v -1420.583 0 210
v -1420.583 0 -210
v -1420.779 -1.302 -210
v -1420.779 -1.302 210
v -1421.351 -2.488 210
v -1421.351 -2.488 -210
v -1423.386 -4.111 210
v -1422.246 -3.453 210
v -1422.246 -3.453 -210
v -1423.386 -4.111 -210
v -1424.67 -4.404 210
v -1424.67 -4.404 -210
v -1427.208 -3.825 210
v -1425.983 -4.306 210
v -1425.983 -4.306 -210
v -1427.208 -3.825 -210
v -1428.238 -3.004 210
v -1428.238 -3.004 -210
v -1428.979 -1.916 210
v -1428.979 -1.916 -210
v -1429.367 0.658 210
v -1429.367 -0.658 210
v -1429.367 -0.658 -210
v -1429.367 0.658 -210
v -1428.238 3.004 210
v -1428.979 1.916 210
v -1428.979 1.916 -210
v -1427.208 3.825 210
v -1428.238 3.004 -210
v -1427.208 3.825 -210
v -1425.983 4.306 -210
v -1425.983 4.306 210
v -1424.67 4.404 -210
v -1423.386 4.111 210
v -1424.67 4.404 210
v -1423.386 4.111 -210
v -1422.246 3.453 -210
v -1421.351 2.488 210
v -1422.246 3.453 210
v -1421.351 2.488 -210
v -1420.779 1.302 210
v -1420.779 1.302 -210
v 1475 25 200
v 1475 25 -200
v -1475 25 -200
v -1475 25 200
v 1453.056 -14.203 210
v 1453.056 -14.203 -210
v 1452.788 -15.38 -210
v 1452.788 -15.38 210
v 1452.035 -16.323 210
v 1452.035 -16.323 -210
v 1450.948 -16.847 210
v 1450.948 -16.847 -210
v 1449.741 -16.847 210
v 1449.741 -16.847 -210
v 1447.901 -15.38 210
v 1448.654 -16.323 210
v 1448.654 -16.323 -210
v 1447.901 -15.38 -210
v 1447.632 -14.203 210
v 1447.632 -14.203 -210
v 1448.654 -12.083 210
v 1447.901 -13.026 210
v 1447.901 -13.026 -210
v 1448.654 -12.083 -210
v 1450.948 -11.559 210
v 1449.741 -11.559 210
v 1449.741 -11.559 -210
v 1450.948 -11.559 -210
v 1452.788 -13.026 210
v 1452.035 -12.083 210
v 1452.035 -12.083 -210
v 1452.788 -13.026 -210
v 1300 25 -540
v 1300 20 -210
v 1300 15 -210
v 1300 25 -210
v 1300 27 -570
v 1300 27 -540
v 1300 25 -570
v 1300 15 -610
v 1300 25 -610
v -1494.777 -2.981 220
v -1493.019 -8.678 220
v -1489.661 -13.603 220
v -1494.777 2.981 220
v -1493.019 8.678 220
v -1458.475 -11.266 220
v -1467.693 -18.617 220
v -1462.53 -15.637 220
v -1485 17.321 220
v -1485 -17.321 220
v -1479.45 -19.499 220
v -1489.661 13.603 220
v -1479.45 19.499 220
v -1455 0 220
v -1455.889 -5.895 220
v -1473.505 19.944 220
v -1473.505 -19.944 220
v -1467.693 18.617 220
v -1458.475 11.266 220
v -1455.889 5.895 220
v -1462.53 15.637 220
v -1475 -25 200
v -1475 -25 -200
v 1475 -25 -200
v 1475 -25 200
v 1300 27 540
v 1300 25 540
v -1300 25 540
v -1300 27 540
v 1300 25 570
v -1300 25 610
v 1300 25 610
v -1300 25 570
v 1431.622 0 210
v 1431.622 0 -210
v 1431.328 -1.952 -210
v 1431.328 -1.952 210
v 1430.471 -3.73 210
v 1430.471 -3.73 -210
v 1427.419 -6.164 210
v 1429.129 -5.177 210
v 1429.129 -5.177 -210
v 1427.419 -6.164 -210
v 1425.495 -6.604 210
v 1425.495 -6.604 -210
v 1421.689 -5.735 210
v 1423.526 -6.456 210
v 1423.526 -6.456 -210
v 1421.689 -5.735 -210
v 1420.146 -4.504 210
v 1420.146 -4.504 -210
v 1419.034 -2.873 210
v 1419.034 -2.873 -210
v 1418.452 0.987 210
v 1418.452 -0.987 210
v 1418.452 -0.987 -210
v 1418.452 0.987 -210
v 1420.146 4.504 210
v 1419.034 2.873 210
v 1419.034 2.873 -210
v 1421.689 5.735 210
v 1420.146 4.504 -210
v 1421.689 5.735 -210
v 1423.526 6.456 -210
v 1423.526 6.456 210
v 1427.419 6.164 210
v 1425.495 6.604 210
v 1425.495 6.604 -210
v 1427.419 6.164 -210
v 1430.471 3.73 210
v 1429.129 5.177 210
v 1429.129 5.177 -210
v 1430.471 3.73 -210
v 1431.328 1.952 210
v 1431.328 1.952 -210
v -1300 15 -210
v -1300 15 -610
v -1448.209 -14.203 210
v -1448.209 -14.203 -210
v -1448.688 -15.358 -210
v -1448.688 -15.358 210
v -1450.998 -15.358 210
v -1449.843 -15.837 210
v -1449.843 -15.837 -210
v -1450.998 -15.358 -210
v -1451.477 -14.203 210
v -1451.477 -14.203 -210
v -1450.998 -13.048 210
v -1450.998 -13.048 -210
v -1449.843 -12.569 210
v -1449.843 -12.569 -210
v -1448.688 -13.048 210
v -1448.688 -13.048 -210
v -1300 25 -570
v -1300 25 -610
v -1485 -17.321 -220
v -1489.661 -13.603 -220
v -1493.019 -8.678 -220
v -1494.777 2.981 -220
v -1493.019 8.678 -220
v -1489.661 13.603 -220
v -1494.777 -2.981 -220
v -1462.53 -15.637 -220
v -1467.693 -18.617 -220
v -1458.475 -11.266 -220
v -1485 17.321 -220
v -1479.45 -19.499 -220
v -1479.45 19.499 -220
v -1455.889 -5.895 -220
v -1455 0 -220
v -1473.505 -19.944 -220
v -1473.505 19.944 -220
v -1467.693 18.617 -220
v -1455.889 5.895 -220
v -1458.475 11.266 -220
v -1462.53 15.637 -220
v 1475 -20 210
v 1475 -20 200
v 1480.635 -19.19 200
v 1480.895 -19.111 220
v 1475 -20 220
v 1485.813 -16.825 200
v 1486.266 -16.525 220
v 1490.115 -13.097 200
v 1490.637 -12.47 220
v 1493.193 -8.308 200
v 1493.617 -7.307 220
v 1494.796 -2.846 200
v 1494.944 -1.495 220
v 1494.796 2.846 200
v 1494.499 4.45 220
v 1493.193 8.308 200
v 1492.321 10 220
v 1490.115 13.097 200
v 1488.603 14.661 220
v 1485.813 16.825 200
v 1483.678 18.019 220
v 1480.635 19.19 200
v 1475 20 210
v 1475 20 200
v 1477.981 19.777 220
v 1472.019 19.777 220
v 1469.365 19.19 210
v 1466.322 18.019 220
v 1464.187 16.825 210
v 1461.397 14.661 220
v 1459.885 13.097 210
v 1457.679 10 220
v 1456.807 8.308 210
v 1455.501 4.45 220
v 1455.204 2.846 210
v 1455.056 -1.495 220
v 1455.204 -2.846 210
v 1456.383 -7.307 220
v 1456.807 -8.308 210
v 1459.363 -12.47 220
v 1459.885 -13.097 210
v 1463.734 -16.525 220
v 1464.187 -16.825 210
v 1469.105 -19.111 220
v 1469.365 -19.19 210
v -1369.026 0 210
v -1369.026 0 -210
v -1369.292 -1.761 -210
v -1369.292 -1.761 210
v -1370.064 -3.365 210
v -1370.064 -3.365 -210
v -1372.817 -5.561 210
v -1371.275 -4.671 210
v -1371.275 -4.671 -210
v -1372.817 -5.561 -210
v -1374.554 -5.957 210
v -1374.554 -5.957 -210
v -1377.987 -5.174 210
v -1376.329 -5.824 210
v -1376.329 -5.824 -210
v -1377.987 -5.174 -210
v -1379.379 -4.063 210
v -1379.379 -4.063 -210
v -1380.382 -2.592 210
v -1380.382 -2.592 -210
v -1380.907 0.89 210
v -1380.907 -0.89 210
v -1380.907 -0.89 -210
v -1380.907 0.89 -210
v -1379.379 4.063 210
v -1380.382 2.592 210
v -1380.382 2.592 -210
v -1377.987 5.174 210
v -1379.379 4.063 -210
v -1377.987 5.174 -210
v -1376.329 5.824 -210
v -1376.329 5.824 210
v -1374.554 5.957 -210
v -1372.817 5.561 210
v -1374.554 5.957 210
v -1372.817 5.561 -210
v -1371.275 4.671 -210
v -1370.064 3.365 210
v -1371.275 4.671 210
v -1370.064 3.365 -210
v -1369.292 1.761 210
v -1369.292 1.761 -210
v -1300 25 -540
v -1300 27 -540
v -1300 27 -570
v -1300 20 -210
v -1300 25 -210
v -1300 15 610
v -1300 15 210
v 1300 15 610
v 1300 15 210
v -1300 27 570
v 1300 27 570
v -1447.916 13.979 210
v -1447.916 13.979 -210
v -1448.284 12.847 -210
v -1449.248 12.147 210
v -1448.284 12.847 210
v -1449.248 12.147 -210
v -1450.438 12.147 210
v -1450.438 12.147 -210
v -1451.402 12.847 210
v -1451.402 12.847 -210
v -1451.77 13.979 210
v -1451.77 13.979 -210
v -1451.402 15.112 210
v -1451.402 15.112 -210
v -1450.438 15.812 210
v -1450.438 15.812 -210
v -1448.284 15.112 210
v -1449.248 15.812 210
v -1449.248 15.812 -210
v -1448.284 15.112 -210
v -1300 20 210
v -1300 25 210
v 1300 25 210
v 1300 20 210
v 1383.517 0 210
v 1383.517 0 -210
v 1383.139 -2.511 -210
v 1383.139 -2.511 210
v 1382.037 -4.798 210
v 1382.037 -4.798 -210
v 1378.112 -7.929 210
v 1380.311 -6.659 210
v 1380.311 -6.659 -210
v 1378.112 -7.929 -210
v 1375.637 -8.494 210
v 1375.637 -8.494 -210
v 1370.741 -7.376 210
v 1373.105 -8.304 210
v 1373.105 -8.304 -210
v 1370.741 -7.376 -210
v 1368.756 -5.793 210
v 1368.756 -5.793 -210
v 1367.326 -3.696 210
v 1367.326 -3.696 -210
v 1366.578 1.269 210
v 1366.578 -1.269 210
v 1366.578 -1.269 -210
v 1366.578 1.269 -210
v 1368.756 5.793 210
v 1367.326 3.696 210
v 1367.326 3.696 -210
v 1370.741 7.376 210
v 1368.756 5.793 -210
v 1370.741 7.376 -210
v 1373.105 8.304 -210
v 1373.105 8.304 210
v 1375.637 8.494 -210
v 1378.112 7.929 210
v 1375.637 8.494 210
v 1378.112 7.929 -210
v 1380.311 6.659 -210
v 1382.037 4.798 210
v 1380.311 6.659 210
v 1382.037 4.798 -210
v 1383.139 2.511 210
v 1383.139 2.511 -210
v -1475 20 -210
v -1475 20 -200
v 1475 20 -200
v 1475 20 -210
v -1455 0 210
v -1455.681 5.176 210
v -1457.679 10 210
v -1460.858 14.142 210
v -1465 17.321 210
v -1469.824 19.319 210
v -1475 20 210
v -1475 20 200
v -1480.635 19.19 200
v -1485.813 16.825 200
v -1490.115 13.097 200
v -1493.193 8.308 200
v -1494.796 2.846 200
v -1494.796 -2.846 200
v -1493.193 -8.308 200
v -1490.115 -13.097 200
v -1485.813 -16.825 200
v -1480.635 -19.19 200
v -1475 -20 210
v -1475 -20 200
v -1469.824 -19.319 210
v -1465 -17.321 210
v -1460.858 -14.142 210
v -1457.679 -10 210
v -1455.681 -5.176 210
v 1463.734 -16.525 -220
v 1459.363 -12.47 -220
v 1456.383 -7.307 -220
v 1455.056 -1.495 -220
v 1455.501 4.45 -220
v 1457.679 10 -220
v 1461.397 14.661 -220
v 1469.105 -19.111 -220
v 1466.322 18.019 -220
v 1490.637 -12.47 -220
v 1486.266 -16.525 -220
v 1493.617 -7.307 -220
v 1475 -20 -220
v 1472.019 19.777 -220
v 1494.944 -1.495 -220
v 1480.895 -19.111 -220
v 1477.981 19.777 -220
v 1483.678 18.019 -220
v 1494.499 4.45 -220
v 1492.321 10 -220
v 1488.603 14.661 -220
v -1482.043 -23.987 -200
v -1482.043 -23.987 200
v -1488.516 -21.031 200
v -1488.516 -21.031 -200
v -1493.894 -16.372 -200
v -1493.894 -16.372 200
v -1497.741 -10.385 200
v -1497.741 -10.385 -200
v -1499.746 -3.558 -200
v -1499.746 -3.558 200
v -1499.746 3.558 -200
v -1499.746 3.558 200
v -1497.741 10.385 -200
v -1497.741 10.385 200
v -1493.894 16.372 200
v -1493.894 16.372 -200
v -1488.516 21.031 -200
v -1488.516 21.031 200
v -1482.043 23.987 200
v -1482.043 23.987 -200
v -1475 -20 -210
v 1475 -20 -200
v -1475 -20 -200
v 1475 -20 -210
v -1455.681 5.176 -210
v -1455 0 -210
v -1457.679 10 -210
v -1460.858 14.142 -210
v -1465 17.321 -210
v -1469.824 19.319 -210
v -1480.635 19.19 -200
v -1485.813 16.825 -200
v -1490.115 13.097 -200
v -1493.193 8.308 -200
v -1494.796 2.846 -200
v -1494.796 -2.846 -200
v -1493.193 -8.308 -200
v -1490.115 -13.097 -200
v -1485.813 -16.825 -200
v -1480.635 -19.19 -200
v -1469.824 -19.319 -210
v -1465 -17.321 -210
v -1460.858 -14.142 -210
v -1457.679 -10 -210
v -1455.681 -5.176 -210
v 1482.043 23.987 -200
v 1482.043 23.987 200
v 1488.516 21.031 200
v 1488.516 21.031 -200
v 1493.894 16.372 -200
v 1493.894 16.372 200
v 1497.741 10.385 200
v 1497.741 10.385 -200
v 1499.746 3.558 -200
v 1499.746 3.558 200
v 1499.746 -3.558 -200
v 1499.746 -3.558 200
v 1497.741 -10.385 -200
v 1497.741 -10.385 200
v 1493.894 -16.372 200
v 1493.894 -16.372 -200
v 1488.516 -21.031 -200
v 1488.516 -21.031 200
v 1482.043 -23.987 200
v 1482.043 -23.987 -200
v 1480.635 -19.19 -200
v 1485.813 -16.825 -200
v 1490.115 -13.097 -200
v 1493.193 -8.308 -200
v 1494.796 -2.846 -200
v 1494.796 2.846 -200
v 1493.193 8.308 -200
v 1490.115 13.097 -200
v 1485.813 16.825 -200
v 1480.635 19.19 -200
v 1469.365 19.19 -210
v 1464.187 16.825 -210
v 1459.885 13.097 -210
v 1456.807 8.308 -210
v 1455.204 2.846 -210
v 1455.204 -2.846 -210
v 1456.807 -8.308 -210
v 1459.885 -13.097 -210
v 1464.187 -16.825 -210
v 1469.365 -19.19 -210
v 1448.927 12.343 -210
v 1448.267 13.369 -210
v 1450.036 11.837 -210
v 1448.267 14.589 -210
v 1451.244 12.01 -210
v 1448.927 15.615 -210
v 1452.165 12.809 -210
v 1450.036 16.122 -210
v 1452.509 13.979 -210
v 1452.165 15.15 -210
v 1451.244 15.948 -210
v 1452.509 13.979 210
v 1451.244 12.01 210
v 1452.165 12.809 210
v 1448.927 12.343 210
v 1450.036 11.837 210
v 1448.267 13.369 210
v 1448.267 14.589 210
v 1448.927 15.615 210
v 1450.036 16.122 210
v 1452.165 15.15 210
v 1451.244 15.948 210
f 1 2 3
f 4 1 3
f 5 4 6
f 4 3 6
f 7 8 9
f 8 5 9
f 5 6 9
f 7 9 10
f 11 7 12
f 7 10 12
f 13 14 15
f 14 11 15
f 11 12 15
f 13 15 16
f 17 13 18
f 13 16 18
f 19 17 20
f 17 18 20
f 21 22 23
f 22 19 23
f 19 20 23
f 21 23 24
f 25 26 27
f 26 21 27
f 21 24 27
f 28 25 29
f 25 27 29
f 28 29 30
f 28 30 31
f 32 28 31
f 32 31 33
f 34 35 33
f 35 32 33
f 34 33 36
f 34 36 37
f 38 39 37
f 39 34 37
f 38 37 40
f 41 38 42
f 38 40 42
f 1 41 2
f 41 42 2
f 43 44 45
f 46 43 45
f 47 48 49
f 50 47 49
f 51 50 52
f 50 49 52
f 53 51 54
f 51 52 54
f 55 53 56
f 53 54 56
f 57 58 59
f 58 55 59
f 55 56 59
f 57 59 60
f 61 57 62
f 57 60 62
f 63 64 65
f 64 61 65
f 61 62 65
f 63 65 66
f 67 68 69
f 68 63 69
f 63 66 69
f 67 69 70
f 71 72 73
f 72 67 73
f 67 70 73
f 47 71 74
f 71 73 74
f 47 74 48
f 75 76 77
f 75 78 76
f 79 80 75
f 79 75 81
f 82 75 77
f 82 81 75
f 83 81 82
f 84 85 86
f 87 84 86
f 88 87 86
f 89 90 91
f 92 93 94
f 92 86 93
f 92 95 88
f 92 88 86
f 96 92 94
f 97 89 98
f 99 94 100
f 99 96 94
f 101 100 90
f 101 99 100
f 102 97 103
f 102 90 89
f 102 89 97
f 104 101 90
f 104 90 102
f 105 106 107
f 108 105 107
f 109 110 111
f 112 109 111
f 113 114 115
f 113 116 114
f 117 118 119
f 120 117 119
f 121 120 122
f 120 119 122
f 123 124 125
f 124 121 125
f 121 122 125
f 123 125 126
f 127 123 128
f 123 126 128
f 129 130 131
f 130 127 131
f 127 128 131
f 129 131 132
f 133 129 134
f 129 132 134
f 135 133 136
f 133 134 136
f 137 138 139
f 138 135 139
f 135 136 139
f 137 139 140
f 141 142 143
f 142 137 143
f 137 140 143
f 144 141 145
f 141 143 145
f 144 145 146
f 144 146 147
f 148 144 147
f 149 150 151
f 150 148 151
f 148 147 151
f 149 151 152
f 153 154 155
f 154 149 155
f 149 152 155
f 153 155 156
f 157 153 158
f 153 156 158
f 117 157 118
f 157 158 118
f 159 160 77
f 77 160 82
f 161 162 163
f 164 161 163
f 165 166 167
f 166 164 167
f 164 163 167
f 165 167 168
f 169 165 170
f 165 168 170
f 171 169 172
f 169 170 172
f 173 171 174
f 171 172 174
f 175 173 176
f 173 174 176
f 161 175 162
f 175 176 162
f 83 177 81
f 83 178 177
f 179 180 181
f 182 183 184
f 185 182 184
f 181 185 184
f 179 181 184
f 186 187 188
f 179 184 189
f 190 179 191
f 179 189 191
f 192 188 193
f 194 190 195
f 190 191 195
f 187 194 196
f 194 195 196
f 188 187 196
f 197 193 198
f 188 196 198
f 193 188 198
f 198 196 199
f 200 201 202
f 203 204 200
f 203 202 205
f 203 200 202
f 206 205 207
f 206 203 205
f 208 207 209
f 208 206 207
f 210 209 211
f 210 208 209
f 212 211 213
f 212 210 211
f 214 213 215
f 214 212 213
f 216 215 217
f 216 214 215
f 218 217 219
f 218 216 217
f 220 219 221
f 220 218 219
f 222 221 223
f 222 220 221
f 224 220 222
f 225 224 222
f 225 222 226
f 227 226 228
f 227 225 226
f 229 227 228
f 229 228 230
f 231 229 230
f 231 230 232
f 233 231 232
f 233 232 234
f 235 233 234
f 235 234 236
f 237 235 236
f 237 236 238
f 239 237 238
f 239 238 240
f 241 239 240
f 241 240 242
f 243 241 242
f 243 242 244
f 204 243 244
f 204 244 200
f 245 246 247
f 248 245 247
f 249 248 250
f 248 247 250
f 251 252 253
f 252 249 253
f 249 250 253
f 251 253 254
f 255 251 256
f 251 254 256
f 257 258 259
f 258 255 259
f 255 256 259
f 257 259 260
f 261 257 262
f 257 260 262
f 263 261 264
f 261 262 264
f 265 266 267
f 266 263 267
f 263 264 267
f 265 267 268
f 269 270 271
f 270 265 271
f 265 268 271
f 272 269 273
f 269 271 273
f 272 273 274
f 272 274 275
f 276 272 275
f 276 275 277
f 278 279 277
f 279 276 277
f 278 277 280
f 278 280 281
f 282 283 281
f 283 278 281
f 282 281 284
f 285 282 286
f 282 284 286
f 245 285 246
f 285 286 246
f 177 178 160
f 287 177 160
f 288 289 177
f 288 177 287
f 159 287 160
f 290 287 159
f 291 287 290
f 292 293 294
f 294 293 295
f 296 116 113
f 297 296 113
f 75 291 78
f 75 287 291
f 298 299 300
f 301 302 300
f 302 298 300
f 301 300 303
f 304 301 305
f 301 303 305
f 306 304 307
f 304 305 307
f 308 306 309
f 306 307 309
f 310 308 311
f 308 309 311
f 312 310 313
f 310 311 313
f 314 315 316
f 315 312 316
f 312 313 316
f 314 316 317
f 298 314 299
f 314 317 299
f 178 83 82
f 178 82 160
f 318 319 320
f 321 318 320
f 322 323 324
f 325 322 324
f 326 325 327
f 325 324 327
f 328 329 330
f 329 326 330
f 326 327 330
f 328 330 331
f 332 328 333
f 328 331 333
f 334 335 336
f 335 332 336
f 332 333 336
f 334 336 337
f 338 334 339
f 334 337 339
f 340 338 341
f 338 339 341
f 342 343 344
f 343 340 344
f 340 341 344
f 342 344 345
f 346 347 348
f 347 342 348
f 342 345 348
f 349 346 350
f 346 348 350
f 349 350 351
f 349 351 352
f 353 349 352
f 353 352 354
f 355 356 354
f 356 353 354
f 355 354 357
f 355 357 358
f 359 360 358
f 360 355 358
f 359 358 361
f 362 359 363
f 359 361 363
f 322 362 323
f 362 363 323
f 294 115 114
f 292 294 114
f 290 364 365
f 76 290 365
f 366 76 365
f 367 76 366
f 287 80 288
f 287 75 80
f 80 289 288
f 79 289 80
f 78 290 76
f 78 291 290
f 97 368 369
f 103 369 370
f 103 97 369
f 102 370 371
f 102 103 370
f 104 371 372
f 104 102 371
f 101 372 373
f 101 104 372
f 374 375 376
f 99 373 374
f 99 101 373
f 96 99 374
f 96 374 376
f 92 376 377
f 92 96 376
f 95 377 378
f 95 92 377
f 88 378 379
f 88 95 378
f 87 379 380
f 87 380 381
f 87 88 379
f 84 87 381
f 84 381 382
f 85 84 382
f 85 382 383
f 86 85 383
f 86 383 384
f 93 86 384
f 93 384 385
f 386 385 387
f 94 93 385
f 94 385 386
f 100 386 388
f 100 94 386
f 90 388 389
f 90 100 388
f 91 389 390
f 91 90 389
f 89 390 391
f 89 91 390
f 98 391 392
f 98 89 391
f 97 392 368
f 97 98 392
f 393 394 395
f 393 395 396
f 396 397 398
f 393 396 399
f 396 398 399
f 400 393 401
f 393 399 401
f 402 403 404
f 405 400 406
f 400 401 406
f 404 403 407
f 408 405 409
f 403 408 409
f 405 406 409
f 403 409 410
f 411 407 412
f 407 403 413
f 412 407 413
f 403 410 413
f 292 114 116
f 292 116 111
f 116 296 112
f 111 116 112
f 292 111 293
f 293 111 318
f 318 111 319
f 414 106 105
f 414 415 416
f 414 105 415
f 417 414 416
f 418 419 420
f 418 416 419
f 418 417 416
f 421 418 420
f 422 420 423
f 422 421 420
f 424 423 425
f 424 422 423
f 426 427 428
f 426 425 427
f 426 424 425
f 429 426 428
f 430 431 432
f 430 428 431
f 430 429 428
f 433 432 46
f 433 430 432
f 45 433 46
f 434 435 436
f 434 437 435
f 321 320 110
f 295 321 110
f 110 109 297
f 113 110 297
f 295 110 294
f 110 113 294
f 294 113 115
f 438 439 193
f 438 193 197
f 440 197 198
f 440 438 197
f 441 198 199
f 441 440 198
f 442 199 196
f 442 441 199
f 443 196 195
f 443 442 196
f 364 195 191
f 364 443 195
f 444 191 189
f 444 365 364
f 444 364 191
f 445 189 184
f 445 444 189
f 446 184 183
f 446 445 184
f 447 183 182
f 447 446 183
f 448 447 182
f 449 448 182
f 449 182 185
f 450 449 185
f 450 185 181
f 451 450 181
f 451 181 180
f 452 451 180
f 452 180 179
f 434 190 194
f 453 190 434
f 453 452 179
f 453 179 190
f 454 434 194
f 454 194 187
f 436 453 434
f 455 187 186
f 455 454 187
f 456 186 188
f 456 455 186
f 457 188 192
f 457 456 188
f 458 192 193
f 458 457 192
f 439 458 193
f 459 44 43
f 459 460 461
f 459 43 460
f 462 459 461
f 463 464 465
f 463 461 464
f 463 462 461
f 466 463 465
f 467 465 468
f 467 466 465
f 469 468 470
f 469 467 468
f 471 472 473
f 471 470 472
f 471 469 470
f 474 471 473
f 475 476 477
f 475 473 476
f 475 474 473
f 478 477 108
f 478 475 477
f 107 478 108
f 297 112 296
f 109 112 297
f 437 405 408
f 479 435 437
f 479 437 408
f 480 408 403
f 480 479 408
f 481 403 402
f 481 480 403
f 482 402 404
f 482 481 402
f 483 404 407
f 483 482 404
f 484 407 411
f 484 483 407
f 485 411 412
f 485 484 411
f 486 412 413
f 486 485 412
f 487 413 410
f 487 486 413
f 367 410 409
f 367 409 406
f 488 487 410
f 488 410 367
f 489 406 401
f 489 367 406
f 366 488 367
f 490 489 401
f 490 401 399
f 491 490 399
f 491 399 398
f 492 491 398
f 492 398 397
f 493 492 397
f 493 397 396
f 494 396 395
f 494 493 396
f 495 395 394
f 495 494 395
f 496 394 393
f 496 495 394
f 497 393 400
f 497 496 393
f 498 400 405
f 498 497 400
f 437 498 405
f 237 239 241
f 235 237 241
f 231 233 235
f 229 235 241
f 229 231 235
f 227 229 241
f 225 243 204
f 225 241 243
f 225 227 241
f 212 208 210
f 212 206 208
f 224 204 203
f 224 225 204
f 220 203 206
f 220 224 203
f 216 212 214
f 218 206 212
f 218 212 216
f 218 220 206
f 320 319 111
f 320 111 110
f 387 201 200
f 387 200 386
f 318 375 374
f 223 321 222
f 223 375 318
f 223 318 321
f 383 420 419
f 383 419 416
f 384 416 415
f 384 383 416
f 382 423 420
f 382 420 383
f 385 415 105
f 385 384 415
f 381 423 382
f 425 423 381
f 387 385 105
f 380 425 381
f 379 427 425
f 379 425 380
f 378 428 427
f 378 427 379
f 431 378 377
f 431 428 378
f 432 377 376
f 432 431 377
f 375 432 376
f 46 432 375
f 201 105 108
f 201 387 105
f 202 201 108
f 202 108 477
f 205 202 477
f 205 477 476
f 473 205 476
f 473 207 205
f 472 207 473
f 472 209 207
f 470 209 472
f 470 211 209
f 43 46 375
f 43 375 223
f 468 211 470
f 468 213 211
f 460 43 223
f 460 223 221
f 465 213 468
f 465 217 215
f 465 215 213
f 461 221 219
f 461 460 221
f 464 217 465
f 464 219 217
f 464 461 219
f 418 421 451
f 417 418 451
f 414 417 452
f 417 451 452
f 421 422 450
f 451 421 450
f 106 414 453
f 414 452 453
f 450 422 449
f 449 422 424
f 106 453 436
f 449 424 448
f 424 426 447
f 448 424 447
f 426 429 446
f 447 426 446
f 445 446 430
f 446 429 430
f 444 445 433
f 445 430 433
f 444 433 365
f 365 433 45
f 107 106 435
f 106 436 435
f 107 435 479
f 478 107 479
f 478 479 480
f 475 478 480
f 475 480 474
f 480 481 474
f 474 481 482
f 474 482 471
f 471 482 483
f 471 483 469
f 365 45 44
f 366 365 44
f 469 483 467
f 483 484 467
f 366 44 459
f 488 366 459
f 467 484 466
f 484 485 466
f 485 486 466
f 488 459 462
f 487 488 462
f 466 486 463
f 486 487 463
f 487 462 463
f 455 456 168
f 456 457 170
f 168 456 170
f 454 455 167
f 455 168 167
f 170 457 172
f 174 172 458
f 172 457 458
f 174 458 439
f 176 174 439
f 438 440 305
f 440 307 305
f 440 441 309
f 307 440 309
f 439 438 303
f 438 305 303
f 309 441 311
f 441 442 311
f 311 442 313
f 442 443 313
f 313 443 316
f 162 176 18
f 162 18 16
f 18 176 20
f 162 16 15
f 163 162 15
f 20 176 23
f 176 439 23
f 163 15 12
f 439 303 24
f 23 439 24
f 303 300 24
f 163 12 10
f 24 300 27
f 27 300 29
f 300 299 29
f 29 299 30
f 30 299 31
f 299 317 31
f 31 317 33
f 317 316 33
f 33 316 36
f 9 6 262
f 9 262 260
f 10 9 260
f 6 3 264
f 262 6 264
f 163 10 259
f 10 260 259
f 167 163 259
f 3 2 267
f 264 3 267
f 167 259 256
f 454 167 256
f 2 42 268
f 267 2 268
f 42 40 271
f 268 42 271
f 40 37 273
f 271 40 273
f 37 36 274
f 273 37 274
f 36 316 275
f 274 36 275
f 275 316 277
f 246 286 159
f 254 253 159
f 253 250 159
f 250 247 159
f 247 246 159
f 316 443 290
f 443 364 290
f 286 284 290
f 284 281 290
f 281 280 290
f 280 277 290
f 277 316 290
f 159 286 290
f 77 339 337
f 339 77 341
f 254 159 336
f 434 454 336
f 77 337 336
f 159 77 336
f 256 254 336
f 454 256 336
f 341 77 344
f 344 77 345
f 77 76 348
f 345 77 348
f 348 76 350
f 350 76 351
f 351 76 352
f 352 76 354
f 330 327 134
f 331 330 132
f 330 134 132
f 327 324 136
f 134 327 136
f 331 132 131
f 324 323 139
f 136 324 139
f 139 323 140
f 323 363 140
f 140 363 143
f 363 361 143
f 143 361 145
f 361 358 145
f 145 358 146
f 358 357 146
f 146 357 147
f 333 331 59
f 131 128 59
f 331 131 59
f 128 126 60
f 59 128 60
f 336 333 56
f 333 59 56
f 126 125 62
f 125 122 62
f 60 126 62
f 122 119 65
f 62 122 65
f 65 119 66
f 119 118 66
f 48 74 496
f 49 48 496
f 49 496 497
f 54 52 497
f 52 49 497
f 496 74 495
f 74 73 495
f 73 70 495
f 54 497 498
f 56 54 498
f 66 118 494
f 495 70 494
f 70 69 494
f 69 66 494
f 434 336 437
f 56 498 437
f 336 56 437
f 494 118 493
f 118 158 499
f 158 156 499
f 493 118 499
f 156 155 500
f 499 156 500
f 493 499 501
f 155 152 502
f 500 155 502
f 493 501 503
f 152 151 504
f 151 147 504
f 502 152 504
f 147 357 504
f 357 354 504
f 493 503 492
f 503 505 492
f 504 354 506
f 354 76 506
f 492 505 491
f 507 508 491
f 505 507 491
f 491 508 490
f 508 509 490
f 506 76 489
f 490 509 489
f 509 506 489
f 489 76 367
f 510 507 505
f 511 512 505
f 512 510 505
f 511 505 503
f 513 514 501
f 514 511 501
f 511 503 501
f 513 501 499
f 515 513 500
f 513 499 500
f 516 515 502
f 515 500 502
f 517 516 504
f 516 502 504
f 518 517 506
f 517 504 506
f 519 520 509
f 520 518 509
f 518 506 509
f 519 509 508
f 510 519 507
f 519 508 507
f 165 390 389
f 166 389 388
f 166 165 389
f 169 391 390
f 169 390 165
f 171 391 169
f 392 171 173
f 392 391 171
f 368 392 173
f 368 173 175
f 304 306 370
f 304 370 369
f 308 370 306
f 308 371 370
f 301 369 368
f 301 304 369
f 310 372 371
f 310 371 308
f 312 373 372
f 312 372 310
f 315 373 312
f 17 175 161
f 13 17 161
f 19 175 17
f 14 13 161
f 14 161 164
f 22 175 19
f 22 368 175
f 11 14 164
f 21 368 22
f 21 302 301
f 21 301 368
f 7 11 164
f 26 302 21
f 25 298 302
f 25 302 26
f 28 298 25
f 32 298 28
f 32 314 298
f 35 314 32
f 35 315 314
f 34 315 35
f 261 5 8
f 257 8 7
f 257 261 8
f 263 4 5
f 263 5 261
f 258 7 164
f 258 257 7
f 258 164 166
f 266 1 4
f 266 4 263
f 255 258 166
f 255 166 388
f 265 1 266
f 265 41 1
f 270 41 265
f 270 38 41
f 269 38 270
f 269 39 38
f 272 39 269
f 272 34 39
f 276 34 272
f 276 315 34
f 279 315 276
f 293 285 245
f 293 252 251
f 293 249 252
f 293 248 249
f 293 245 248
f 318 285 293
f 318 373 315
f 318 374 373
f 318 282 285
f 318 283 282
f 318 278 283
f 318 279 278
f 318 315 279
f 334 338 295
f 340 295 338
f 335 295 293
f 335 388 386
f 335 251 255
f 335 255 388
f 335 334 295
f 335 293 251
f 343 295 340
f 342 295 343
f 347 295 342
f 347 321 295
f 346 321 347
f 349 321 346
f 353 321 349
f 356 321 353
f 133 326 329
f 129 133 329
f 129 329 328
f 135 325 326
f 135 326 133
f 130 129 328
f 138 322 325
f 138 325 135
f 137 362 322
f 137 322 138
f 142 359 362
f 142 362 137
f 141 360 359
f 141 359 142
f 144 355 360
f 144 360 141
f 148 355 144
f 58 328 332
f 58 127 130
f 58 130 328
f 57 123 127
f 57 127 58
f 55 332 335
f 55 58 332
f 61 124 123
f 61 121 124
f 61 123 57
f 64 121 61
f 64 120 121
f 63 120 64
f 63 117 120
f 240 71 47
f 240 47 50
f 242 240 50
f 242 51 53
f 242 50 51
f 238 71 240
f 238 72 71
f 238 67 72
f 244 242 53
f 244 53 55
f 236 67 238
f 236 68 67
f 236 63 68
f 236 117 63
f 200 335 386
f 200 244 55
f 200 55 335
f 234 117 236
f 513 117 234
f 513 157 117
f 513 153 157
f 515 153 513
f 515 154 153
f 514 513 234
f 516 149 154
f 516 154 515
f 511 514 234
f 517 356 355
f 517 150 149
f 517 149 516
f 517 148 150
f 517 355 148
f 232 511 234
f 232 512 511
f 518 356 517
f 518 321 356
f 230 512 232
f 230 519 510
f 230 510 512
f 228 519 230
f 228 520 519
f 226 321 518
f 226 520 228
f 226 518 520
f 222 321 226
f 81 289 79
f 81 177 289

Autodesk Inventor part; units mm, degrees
ref_plane "YZ Plane" through (0, 0, 0) normal (1, 0, 0) x (0, 1, 0)
ref_plane "XZ Plane" through (0, 0, 0) normal (0, 1, 0) x (-1, 0, 0)
ref_plane "XY Plane" through (0, 0, 0) normal (0, 0, 1) x (1, 0, 0)
sketch "Sketch1" plane through (0, 0, 0) normal (0, 0, 1) x (1, 0, 0)
  line L0 (-1500, 0) -> (1500, 0) construction
  line L1 (-1475, -25) -> (1475, -25)
  line L2 (1475, 25) -> (-1475, 25)
  arc A0 (-1475, 25) -> (-1475, -25) centre (-1475, 0) ccw
  arc A1 (1475, -25) -> (1475, 25) centre (1475, 0) ccw
  line L3 (-1475, 20) -> (1475, 20)
  arc A2 (1475, -20) -> (1475, 20) centre (1475, 0) ccw
  line L4 (1475, -20) -> (-1475, -20)
  arc A3 (-1475, 20) -> (-1475, -20) centre (-1475, 0) ccw
  circle A4 centre (-1475, 0) radius 20
  circle A5 centre (1475, 0) radius 20
  circle A6 centre (-1425, 0) radius 4.4168
  circle A7 centre (-1375, 0) radius 5.9739
  circle A8 centre (-1449.8431, 13.9793) radius 1.9266
  circle A9 centre (-1449.8431, -14.2029) radius 1.6337
  circle A10 centre (1450.3444, 13.9793) radius 2.1646
  circle A11 centre (1450.3444, -14.2029) radius 2.7119
  circle A12 centre (1425, 0) radius 6.6221
  circle A13 centre (1375, 0) radius 8.5174
  point P0 (0, 0)
  point P1 (0, 0)
  point P2 (1500, 0)
  point P3 (-1500, 0)
  dimension "d0" = 3000
  dimension "d1" = 50
  dimension "d2" = 5
  dimension "d17" = 75
  dimension "d18" = 50
  dimension "d19" = 75
  dimension "d20" = 50
extrude "Extrusion1" add sketch "Sketch1" along normal mid plane 400 contours A0 L2 A1 L1
extrude "Extrusion2" add sketch "Sketch1" along normal mid plane 420 contours L3 A5 L4 A4
extrude "Extrusion3" add sketch "Sketch1" along normal mid plane 440 contours A4 A3 | A2 A5
sketch "Sketch2" plane through (-1475, 25, 200) normal (0, 1, 0) x (1, 0, 0)
  line L0 (0, 410) -> (2950, 410) projected
  line L1 (175, 410) -> (2775, 410)
  line L2 (2775, 410) -> (2775, 810)
  line L3 (2775, 810) -> (175, 810)
  line L4 (175, 810) -> (175, 410)
  line L5 (175, 770) -> (2775, 770)
  line L6 (2775, 770) -> (2775, 740)
  line L7 (2775, 740) -> (175, 740)
  line L8 (175, 740) -> (175, 770)
  line L9 (2950, 400) -> (2950, 0) construction
  line L10 (2950, 200) -> (0, 200) construction
  line L11 (0, 400) -> (0, 0) construction
  line L12 (175, -10) -> (2775, -10)
  line L13 (2775, -10) -> (2775, -410)
  line L14 (2775, -410) -> (175, -410)
  line L15 (175, -410) -> (175, -10)
  line L16 (175, -370) -> (2775, -370)
  line L17 (2775, -370) -> (2775, -340)
  line L18 (2775, -340) -> (175, -340)
  line L19 (175, -340) -> (175, -370)
  point P0 (1475, 200)
  point P1 (1475, 410)
  point P2 (1475, -10)
  point P3 (175, -340)
  point P4 (175, 740)
  dimension "d9" = 2600
  dimension "d10" = 400
  dimension "d11" = 30
  dimension "d12" = 40
extrude "Extrusion4" add sketch "Sketch2" against normal blind 10
extrude "Extrusion5" add sketch "Sketch2" along normal blind 2 contours L4 L5 L2 L7 | L18 L13 L16 L15
properties part number "SACMI DPA CARDBOARD CONVEYOR"
